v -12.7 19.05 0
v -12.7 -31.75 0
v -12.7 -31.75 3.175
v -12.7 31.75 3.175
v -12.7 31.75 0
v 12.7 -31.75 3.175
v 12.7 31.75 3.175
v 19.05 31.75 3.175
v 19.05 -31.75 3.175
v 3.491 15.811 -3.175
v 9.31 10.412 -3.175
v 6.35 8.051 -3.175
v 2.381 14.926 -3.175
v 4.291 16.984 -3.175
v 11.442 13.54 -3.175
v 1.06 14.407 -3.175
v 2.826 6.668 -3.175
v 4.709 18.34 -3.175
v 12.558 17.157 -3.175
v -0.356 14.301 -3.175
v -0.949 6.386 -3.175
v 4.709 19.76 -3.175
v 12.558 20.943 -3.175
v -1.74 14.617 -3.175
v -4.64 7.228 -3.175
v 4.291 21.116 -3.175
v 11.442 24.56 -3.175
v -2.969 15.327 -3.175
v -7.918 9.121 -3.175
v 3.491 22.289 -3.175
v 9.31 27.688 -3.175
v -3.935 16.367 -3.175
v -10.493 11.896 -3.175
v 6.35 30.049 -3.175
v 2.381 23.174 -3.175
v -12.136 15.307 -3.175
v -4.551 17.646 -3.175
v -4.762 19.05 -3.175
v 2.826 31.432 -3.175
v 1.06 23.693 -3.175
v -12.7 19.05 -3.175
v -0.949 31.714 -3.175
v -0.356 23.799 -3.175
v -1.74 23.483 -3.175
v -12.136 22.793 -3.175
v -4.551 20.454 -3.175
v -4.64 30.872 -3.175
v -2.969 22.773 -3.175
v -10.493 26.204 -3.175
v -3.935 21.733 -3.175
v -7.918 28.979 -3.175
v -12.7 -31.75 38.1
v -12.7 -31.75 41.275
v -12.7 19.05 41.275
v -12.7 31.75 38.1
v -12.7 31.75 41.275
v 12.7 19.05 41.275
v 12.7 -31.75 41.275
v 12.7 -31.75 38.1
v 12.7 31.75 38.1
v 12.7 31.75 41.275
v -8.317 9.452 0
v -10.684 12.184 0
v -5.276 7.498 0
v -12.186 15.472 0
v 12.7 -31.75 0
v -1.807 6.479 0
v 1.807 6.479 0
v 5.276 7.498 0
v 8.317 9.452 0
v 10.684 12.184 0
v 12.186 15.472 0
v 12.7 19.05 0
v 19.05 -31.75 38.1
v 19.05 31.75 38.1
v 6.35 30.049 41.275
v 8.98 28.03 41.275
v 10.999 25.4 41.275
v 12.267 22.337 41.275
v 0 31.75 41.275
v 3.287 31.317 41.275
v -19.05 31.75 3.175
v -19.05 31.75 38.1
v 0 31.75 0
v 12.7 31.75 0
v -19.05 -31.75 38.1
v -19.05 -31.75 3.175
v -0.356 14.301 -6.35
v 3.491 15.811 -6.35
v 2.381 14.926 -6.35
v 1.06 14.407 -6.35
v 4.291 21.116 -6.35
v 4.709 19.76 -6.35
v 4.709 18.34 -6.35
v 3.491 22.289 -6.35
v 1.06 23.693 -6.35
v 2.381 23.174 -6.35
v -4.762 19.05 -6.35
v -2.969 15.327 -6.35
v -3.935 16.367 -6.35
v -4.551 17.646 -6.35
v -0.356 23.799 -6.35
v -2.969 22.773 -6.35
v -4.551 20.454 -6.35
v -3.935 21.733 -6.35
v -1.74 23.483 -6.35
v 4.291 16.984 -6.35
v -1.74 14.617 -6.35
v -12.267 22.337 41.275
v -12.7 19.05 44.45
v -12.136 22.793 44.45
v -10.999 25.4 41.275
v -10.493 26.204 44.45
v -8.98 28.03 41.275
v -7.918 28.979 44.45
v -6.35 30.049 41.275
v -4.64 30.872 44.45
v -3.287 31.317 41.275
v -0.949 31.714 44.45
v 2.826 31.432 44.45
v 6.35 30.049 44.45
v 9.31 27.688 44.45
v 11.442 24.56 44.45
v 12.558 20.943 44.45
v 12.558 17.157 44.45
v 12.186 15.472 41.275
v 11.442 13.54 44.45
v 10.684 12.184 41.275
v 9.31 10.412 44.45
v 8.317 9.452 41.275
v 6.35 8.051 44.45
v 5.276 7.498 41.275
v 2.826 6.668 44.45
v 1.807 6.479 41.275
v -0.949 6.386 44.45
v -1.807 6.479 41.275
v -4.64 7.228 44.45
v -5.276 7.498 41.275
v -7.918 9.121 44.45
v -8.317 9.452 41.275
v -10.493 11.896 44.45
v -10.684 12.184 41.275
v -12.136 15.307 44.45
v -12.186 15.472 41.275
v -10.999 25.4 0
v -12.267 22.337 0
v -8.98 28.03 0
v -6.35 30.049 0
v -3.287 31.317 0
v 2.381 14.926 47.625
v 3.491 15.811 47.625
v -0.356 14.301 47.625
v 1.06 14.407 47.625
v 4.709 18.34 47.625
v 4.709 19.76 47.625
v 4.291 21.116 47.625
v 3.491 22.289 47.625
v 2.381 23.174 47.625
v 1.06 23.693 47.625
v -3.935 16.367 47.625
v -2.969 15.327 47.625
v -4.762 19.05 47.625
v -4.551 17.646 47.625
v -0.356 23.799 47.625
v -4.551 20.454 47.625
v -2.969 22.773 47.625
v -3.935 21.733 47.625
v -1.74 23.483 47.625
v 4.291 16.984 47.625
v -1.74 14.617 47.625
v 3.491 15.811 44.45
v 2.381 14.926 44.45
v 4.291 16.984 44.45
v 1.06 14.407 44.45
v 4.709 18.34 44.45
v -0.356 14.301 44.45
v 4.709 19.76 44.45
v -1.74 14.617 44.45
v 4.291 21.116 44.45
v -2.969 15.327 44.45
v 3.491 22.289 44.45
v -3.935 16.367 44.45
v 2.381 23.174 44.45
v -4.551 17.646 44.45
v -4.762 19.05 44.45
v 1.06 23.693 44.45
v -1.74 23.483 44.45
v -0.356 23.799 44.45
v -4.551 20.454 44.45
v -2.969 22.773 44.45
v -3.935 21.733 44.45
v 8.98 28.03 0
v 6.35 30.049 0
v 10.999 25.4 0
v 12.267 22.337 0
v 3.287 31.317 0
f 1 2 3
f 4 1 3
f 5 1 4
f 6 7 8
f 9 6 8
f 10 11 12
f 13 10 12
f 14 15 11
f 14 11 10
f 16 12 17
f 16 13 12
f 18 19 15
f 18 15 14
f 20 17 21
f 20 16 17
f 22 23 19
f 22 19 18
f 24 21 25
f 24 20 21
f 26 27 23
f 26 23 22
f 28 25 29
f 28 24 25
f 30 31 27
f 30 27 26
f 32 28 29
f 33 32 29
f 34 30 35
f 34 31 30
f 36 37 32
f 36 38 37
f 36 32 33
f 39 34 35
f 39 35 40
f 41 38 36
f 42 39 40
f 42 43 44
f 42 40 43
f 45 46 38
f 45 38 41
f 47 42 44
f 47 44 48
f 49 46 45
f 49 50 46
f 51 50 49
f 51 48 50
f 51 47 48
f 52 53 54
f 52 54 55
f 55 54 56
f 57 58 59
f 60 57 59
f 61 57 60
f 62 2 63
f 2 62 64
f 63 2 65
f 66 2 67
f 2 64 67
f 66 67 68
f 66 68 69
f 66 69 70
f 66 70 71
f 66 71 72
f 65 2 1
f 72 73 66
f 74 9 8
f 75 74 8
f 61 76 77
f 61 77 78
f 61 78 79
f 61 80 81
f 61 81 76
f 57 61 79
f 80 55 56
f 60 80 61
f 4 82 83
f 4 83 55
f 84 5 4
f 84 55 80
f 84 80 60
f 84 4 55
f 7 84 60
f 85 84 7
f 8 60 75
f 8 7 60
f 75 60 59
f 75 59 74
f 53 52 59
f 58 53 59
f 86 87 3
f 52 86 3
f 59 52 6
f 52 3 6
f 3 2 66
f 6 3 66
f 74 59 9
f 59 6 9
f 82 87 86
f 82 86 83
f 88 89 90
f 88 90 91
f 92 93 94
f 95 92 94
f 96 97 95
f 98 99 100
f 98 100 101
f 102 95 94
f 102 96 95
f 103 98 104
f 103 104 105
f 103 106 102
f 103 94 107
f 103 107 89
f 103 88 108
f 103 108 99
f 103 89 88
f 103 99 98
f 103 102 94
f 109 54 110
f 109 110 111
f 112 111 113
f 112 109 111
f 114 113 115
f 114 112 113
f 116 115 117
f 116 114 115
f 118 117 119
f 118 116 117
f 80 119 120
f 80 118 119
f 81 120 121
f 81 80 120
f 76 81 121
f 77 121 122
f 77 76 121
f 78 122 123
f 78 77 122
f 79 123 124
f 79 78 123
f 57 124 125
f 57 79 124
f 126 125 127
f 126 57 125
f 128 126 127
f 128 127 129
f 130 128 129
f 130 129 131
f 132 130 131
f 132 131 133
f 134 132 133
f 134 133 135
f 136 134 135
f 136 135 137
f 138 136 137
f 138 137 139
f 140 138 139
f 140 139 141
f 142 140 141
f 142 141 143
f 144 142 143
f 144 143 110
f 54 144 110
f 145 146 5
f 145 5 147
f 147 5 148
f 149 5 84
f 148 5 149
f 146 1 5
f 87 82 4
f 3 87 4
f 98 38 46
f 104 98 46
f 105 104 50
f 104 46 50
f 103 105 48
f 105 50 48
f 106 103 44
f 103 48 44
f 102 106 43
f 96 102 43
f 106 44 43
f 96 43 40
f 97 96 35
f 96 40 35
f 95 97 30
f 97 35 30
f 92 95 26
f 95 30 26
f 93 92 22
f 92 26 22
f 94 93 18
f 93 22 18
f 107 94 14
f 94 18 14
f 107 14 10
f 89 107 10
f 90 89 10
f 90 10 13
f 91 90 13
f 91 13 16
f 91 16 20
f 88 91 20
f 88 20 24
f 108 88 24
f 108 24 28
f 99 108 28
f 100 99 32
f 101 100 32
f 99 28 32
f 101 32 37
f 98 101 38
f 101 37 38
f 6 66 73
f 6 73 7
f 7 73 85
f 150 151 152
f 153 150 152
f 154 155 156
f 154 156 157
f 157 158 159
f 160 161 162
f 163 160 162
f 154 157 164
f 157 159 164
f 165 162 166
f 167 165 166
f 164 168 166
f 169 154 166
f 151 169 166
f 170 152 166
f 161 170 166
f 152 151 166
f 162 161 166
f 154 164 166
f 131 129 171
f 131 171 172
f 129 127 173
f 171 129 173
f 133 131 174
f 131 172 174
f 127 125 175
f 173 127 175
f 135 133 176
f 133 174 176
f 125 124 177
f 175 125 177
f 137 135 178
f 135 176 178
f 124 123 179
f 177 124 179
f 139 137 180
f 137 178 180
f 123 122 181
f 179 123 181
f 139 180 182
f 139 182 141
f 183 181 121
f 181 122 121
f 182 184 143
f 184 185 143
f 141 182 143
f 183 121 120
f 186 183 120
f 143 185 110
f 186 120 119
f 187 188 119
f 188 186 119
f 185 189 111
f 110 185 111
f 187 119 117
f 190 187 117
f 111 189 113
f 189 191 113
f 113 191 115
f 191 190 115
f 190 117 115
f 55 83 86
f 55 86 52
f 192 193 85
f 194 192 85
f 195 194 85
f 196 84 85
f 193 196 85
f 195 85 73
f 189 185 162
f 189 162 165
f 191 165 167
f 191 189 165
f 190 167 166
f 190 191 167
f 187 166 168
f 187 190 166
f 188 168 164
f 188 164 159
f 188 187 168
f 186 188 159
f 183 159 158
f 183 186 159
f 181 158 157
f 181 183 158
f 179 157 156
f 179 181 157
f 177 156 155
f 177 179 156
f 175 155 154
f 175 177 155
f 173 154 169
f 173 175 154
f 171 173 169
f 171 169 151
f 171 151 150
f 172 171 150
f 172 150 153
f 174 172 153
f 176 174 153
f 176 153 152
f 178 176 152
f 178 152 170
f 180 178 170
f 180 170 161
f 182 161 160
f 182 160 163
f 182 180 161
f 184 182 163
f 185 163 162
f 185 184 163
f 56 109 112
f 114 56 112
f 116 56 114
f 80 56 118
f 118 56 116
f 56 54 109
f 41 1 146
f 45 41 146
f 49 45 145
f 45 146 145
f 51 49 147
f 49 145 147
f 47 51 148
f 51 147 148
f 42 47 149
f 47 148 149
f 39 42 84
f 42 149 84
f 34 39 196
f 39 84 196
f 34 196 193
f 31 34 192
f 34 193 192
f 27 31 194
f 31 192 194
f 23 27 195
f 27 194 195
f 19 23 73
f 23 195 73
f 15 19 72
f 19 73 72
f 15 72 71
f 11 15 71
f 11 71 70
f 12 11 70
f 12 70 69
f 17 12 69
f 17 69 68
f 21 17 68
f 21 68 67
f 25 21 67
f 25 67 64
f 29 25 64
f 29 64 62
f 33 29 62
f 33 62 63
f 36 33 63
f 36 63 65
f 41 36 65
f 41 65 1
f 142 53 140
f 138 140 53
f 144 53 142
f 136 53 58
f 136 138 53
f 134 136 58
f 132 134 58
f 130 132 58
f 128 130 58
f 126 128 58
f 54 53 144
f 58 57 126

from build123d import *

# Parameters (mm, degrees)
SKETCH1_W           = 38.1
SKETCH1_H           = 63.5
BOSS_EXTRUDE1_DEPTH = 41.275
SKETCH2_R           = 12.7
BOSS_EXTRUDE2_DEPTH = 3.175
SKETCH3_R           = 4.7625
BOSS_EXTRUDE3_DEPTH = 3.175
SKETCH5_W           = 6.35
SKETCH5_H           = 63.5
CUT_EXTRUDE1_DEPTH  = 3.175


with BuildPart() as part:
    # Sketch1 → Boss-Extrude1 (new body)
    with BuildSketch(Plane.XY):
        Rectangle(SKETCH1_W, SKETCH1_H)
    extrude(amount=BOSS_EXTRUDE1_DEPTH)

    # Sketch2 → Boss-Extrude2 (add)
    with BuildSketch(Plane(origin=(0, 0, 0), x_dir=(-1, 0, 0), z_dir=(0, 0, -1))):
        with Locations((0, 19.05)):
            Circle(SKETCH2_R)
    boss_extrude2 = extrude(amount=BOSS_EXTRUDE2_DEPTH)

    # Sketch3 → Boss-Extrude3 (add)
    with BuildSketch(Plane(origin=(0, 0, -3.175), x_dir=(-1, 0, 0), z_dir=(0, 0, -1))):
        with Locations((0, 19.05)):
            Circle(SKETCH3_R)
    boss_extrude3 = extrude(amount=BOSS_EXTRUDE3_DEPTH)

    # Mirror1: Boss-Extrude2, Boss-Extrude3 across plane
    add(boss_extrude2.mirror(Plane(origin=(0, 0, 20.6375), x_dir=(1, 0, 0), z_dir=(0, 0, -1))))
    add(boss_extrude3.mirror(Plane(origin=(0, 0, 20.6375), x_dir=(1, 0, 0), z_dir=(0, 0, -1))))

    # Sketch5 → Cut-Extrude1 (cut)
    with BuildSketch(Plane.XY.offset(41.275)):
        with Locations((-15.875, 0)):
            Rectangle(SKETCH5_W, SKETCH5_H)
        with Locations((15.875, 0)):
            Rectangle(SKETCH5_W, SKETCH5_H)
    cut_extrude1 = extrude(amount=-CUT_EXTRUDE1_DEPTH, mode=Mode.SUBTRACT)

    # Mirror2: Cut-Extrude1 across plane
    add(cut_extrude1.mirror(Plane(origin=(0, 0, 20.6375), x_dir=(1, 0, 0), z_dir=(0, 0, -1))), mode=Mode.SUBTRACT)


solid = part.part
